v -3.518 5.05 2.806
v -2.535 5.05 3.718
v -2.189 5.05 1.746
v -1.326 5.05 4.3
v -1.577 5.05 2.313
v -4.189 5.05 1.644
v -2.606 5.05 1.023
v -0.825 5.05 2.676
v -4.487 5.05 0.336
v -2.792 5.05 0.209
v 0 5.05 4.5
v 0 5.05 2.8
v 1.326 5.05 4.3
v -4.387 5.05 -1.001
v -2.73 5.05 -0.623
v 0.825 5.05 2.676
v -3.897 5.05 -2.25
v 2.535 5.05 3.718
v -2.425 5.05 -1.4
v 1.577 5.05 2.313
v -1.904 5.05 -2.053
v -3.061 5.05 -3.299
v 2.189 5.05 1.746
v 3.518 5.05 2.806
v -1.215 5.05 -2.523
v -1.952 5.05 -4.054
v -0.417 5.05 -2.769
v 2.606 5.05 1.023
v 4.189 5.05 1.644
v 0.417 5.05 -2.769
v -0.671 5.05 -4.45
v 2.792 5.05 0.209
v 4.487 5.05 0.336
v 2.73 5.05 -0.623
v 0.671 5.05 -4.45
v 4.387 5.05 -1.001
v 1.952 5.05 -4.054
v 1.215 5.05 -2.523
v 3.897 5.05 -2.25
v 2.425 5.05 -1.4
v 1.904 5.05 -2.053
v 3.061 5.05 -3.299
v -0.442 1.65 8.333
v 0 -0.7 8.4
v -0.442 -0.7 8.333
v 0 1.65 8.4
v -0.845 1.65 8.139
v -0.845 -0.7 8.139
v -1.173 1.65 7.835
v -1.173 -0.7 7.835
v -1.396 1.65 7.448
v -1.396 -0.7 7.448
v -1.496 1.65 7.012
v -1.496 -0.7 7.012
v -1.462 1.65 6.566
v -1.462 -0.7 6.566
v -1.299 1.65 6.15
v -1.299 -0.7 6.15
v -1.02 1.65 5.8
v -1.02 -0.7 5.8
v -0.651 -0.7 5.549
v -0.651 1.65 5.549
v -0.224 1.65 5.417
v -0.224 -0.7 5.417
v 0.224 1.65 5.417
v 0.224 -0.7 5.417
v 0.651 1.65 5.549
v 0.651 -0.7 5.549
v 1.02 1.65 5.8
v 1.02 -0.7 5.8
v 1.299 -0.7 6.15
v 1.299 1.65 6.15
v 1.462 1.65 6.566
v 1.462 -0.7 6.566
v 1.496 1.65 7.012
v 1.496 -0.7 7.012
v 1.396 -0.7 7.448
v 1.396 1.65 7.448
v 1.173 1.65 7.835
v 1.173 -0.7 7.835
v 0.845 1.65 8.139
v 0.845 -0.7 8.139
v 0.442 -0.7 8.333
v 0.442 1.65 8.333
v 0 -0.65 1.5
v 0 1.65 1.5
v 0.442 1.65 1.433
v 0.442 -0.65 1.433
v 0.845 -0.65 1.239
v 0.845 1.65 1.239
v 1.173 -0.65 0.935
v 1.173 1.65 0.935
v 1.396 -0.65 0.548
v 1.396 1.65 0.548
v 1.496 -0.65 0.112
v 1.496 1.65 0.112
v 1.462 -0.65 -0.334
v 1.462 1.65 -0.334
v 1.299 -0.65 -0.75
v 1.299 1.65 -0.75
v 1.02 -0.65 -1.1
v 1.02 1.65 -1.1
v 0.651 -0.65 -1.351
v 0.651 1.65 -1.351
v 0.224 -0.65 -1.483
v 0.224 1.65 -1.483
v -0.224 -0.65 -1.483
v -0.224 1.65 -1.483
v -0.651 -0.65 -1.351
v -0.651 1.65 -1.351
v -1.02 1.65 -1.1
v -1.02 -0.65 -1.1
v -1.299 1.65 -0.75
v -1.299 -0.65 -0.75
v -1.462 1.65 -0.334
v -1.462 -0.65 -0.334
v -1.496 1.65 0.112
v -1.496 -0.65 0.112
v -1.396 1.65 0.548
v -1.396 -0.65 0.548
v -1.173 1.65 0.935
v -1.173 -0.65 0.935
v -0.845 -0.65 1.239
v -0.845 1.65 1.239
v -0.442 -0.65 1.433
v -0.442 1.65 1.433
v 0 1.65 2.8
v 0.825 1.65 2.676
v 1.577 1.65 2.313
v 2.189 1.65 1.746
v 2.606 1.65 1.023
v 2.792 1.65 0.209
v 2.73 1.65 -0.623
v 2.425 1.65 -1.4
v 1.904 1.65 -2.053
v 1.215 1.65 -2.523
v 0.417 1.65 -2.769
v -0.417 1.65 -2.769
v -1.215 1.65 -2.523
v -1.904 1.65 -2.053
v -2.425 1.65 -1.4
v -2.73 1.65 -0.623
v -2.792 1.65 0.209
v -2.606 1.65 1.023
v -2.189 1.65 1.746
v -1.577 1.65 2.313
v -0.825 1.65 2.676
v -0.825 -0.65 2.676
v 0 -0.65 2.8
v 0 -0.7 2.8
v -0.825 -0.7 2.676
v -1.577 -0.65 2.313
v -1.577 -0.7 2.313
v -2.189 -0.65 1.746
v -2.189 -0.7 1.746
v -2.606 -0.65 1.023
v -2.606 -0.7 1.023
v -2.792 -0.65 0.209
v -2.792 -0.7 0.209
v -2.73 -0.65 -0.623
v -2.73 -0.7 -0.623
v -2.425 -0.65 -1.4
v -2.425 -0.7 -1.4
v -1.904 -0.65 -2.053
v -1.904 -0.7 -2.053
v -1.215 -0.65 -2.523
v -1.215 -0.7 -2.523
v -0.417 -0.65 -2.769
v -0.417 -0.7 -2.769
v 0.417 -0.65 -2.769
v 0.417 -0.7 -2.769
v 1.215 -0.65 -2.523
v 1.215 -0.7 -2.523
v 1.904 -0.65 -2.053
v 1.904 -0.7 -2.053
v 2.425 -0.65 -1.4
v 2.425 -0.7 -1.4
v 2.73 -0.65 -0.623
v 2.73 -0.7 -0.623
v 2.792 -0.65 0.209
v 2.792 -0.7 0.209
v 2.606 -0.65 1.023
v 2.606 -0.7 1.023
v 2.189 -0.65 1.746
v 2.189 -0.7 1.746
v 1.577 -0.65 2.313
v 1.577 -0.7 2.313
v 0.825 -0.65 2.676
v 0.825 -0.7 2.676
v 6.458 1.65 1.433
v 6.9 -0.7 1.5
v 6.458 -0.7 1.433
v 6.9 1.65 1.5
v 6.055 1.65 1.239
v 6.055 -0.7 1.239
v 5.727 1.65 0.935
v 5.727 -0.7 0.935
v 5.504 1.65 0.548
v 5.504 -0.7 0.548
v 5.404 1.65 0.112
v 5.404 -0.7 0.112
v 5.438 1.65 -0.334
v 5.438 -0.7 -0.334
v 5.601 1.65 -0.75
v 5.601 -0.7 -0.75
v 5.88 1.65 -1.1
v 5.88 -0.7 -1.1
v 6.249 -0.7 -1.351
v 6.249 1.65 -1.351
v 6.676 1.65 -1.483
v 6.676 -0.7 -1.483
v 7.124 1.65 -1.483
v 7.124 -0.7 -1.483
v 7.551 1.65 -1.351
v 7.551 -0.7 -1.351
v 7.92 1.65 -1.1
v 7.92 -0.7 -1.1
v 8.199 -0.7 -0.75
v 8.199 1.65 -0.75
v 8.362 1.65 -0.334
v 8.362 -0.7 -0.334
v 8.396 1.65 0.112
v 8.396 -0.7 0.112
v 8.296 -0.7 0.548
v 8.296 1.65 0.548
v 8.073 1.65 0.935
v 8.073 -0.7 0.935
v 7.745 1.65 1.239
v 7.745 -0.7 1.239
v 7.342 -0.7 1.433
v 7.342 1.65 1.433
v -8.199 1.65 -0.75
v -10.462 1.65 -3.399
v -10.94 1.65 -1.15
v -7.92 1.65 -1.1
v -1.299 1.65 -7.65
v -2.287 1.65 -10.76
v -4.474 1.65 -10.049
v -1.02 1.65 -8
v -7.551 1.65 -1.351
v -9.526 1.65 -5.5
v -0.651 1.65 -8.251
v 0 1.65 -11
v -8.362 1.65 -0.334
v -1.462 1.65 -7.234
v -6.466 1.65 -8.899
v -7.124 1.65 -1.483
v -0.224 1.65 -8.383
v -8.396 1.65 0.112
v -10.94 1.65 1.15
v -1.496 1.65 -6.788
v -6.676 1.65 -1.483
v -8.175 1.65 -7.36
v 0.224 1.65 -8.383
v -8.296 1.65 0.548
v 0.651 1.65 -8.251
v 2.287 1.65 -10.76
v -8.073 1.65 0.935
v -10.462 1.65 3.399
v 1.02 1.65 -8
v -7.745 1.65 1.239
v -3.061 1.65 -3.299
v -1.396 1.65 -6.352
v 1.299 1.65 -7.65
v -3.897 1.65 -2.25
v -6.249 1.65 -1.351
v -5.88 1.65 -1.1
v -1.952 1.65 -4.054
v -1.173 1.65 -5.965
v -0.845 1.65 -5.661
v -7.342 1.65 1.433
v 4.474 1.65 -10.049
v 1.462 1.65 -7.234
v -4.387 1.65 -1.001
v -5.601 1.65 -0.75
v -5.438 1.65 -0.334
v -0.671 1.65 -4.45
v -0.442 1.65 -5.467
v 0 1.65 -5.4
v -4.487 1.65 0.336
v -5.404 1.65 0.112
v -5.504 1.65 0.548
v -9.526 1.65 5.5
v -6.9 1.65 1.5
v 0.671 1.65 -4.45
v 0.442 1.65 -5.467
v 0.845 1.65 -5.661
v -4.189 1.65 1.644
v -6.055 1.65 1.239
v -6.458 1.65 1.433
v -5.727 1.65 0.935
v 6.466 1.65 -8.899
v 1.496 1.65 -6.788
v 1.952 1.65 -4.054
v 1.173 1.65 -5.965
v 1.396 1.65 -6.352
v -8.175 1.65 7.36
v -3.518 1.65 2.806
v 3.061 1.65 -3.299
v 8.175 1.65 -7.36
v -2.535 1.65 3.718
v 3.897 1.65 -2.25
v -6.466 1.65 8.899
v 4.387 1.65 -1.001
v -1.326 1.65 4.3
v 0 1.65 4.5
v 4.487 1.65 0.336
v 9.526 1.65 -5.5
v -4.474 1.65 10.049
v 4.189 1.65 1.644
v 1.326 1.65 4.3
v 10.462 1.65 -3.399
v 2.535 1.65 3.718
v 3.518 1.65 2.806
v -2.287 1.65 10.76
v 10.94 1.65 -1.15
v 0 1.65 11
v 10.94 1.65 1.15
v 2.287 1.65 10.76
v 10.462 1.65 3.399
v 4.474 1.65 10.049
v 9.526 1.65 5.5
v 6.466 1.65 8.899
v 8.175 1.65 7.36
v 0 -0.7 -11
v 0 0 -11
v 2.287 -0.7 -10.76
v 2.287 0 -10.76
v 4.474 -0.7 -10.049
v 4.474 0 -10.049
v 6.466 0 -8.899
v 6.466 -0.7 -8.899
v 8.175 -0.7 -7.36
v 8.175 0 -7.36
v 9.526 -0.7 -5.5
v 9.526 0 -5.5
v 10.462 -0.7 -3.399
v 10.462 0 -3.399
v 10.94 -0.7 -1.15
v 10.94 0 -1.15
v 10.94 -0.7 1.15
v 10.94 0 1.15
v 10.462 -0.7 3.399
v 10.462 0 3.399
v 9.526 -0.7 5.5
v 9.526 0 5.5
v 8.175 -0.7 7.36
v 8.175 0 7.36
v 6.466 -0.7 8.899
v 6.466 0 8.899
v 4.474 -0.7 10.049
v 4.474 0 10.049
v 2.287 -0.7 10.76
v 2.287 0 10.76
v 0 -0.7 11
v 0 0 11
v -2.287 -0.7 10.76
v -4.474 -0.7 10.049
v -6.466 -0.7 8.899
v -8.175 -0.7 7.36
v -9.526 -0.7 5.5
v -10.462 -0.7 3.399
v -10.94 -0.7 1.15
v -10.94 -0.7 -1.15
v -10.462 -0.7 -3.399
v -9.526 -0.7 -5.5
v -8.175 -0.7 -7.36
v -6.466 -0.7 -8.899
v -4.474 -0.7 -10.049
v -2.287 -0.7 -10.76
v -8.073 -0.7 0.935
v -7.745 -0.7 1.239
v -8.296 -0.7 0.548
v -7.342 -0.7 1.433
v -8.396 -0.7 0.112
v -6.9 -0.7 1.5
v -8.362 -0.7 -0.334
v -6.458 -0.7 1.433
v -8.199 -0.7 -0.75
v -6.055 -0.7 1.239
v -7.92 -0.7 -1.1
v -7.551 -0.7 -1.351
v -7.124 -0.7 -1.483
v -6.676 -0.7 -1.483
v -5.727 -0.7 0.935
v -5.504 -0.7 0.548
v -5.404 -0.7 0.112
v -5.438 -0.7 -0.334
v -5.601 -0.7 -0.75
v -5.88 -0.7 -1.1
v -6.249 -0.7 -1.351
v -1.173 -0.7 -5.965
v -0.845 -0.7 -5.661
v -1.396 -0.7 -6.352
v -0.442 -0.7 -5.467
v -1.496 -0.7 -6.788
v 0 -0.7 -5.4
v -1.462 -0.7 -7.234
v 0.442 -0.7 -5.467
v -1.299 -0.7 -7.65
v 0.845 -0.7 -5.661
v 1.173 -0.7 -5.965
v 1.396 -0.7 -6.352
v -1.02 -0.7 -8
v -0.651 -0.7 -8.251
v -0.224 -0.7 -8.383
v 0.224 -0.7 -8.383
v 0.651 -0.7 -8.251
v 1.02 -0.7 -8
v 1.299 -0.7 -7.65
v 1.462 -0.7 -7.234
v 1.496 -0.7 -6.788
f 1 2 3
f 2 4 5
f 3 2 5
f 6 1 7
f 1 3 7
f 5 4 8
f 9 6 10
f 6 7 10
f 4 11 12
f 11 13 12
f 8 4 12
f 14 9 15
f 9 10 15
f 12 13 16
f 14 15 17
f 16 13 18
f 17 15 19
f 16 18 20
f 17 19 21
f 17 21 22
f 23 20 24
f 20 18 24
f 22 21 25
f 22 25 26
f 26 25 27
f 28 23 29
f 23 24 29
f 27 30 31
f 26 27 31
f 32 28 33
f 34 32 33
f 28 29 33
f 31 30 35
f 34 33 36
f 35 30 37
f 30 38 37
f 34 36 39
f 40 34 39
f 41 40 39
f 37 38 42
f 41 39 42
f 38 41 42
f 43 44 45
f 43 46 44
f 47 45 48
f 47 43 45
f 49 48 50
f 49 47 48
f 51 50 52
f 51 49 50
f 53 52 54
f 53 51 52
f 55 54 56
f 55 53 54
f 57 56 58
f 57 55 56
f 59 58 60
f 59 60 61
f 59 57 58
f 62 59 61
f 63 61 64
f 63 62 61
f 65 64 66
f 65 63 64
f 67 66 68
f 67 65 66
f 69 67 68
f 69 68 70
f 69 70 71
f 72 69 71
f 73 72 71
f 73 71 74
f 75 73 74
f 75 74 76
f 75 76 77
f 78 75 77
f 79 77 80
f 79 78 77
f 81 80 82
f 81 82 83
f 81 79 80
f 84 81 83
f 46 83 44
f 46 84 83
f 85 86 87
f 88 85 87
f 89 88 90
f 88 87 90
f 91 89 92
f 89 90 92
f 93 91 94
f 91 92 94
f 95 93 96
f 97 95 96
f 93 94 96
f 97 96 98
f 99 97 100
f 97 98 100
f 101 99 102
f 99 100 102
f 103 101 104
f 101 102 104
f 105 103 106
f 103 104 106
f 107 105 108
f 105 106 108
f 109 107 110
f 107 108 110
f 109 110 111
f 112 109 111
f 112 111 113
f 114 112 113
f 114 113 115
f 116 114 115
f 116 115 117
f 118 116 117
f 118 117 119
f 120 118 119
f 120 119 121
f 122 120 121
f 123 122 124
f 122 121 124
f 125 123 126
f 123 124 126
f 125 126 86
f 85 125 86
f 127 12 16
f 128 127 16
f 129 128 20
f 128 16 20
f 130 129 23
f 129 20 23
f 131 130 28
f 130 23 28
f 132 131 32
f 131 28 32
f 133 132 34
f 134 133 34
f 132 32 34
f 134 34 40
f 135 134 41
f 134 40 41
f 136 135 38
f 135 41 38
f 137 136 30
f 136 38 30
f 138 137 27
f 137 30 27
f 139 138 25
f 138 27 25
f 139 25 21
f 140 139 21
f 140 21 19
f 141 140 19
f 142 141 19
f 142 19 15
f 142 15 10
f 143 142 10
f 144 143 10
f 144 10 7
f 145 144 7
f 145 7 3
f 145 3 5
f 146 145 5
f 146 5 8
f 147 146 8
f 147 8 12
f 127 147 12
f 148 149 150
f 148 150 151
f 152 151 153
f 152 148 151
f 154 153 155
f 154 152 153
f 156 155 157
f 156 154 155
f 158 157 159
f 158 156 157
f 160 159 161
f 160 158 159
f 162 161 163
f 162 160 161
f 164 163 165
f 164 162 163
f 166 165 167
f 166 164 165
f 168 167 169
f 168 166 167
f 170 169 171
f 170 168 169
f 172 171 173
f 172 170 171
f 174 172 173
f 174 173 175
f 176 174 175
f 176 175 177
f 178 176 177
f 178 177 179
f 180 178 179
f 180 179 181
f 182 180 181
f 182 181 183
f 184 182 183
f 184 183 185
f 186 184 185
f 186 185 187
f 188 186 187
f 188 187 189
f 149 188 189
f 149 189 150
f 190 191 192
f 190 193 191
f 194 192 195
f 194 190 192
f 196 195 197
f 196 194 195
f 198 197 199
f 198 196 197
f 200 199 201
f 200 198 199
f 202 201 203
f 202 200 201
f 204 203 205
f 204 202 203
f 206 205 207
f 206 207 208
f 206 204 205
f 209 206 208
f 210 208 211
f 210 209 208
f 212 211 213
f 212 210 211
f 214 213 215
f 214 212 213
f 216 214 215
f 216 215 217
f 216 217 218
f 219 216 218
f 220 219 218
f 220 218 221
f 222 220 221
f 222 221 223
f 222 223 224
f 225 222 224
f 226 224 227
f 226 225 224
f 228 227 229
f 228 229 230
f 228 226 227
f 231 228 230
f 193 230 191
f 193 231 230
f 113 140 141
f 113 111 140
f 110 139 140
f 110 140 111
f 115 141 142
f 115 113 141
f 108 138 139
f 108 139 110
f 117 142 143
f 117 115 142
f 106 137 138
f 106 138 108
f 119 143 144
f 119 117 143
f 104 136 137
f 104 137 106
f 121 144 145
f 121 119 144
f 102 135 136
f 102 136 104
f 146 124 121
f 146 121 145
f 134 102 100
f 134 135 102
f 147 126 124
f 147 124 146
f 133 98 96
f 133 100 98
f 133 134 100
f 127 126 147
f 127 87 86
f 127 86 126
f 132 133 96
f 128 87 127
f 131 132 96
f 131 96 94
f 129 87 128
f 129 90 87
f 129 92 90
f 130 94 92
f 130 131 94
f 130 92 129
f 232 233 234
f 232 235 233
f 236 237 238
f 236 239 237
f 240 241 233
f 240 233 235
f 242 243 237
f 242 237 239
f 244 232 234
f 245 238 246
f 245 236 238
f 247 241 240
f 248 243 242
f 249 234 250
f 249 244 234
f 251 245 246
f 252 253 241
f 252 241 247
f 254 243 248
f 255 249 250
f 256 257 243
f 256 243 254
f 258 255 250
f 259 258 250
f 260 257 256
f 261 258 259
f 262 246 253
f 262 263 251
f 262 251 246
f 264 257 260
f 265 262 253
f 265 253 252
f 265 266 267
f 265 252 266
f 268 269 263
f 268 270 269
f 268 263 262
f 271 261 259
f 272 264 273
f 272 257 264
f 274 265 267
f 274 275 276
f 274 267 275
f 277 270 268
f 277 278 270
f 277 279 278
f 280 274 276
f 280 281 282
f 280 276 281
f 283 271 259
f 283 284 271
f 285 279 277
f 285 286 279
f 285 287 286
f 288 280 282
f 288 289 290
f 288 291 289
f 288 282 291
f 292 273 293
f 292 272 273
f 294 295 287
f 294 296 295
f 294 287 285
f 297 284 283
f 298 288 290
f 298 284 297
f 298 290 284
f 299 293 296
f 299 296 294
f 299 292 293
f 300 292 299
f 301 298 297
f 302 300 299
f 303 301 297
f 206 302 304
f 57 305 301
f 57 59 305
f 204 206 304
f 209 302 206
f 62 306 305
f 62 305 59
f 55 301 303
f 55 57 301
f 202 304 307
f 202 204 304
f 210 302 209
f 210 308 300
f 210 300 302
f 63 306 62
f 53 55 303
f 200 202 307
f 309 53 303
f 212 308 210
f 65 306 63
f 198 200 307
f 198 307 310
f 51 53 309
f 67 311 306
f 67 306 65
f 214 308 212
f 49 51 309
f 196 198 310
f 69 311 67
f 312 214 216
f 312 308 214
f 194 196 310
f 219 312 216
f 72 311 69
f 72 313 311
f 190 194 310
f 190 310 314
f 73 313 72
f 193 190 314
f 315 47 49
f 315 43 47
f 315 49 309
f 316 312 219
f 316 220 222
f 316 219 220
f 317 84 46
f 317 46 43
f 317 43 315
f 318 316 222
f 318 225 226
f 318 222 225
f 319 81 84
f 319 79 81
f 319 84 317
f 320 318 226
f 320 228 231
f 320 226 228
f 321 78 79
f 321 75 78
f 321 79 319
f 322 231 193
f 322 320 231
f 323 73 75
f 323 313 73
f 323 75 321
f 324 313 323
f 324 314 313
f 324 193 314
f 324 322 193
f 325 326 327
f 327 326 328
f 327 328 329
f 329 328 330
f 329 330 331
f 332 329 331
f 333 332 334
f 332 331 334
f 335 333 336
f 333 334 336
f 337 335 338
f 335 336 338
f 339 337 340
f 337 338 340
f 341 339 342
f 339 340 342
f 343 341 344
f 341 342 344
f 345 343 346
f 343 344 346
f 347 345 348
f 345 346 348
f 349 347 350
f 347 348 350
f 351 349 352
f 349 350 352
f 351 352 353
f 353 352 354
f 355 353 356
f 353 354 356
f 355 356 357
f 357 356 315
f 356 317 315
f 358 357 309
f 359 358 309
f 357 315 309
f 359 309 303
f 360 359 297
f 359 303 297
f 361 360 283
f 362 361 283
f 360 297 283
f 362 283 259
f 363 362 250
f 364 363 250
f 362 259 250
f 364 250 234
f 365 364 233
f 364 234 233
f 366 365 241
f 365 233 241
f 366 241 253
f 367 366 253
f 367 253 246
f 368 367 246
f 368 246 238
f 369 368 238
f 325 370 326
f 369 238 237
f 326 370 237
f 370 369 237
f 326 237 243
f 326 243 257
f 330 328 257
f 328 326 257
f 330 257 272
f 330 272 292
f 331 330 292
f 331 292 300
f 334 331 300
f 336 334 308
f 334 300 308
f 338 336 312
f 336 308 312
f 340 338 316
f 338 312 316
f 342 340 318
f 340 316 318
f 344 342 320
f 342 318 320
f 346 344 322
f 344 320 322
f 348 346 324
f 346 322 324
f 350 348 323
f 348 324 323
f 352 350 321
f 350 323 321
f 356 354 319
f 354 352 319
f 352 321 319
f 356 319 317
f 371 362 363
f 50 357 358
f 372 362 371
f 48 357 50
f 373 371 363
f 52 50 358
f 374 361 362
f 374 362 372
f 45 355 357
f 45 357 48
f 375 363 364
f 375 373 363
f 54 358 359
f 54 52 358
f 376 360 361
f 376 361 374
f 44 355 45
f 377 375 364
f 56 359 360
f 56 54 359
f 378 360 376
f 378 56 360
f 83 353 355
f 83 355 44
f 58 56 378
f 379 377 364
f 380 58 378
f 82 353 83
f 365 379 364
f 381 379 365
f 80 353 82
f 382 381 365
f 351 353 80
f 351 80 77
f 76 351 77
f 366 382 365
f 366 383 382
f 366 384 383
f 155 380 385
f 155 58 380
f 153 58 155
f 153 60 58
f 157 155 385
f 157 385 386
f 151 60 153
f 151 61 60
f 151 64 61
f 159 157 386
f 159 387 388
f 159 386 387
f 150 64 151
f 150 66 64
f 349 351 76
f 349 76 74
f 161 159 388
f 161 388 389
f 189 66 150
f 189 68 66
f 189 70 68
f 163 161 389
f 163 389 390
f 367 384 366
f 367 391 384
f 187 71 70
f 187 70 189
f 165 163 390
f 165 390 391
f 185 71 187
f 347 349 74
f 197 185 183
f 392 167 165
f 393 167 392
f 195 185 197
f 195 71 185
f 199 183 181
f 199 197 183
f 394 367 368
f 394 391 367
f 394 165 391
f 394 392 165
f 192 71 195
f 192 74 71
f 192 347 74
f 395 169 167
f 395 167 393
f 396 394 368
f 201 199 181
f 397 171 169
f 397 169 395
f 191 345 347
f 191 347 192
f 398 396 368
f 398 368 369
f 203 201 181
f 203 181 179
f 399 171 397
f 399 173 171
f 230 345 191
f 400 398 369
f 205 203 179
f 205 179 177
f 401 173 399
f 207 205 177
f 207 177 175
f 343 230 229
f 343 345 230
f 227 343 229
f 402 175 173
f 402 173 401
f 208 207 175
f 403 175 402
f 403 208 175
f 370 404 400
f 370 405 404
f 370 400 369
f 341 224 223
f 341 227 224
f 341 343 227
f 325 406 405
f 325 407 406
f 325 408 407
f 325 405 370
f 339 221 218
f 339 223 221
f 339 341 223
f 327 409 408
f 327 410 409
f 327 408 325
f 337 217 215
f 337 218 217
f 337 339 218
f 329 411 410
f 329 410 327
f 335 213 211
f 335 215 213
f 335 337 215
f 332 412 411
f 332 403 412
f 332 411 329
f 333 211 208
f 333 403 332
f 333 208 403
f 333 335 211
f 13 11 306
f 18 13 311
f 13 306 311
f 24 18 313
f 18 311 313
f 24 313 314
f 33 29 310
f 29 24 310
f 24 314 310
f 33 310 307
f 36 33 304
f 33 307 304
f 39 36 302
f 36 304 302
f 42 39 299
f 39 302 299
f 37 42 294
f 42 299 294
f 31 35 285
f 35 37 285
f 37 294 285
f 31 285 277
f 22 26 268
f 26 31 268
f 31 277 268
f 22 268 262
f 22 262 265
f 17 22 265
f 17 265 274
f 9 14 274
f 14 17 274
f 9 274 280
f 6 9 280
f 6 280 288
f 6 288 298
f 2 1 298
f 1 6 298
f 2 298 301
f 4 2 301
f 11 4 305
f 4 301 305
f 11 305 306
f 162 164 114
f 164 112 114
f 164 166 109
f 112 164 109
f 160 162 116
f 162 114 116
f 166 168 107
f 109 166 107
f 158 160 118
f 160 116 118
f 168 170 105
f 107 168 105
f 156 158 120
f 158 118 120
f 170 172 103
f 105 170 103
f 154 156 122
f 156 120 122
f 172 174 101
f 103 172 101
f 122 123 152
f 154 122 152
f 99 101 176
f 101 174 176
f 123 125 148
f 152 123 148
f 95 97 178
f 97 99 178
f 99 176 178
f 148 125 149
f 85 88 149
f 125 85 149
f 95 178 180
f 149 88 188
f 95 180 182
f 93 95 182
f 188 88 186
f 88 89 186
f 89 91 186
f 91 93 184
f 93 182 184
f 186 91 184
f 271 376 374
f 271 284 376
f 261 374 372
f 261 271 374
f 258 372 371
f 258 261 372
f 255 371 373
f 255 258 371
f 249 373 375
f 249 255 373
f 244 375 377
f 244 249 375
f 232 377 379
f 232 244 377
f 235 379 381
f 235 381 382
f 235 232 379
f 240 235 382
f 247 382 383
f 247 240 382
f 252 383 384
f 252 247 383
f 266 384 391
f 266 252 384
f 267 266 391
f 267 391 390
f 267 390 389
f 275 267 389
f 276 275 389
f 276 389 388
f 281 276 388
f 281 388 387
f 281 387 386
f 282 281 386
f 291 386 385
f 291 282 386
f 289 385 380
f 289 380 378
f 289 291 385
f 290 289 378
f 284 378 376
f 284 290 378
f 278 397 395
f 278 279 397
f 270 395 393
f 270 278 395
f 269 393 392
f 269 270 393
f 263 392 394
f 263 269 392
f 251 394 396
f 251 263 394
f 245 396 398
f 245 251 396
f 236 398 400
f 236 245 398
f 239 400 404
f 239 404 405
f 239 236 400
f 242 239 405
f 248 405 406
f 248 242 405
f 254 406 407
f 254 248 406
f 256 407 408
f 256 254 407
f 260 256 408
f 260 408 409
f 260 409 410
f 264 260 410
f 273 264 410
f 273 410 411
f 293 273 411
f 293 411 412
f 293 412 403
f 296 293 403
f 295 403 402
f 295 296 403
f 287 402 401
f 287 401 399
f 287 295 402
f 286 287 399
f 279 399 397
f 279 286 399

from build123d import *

# Parameters (mm, degrees)
SKETCH1_R           = 11
BOSS_EXTRUDE2_DEPTH = 5.65
SKETCH3_R           = 2.8
SKETCH3_R_2         = 1.5
CUT_EXTRUDE2_DEPTH  = 12
CUT_EXTRUDE3_START  = -4
SKETCH4_R           = 11
SKETCH4_R_2         = 4.5
CUT_EXTRUDE3_DEPTH  = 4
SKETCH5_W           = 9
SKETCH5_H           = 0.6
CUT_EXTRUDE4_DEPTH  = 18
SKETCH6_R           = 2.8
SKETCH6_R_2         = 1.5
BOSS_EXTRUDE4_DEPTH = 2.3
SKETCH7_R           = 11
SKETCH7_R_2         = 2.8
SKETCH7_R_3         = 1.5
BOSS_EXTRUDE5_DEPTH = 0.7


with BuildPart() as part:
    # Sketch1 → Boss-Extrude2 (new body)
    with BuildSketch(Plane(origin=(0, 0, 0), x_dir=(1, 0, 0), z_dir=(0, 1, 0))):
        with Locations(Location((0, 0, 0), (0, 0, 270))):
            Circle(SKETCH1_R)
    extrude(amount=BOSS_EXTRUDE2_DEPTH)

    # Sketch3 → Cut-Extrude2 (cut)
    with BuildSketch(Plane(origin=(0, 5.65, 0), x_dir=(1, 0, 0), z_dir=(0, 1, 0))):
        with Locations(Location((0, 0, 0), (0, 0, 270))):
            Circle(SKETCH3_R)
        with Locations(Location((-6.9, 0, 0), (0, 0, 270))):
            Circle(SKETCH3_R_2)
        with Locations(Location((0, 6.9, 0), (0, 0, 270))):
            Circle(SKETCH3_R_2)
        with Locations(Location((6.9, 0, 0), (0, 0, 270))):
            Circle(SKETCH3_R_2)
        with Locations(Location((0, -6.9, 0), (0, 0, 270))):
            Circle(SKETCH3_R_2)
    extrude(amount=-CUT_EXTRUDE2_DEPTH, mode=Mode.SUBTRACT)

    # Sketch4 → Cut-Extrude3 (cut)
    with BuildSketch(Plane(origin=(0, 5.65, 0), x_dir=(1, 0, 0), z_dir=(0, 1, 0)).offset(CUT_EXTRUDE3_START)):
        with Locations(Location((0, 0, 0), (0, 0, 270))):
            Circle(SKETCH4_R)
        with Locations(Location((0, 0, 0), (0, 0, 270))):
            Circle(SKETCH4_R_2, mode=Mode.SUBTRACT)
    extrude(amount=CUT_EXTRUDE3_DEPTH, mode=Mode.SUBTRACT)

    # Sketch5 → Cut-Extrude4 (cut)
    with BuildSketch(Plane(origin=(10, 0, 0), x_dir=(0, 0, -1), z_dir=(1, 0, 0))):
        with Locations((0, 5.35)):
            Rectangle(SKETCH5_W, SKETCH5_H)
    extrude(amount=-CUT_EXTRUDE4_DEPTH, mode=Mode.SUBTRACT)

    # Sketch6 → Boss-Extrude4 (add)
    with BuildSketch(Plane(origin=(0, 1.65, 0), x_dir=(1, 0, 0), z_dir=(0, 1, 0))):
        with Locations(Location((0, 0, 0), (0, 0, 270))):
            Circle(SKETCH6_R)
        with Locations(Location((0, 0, 0), (0, 0, 270))):
            Circle(SKETCH6_R_2, mode=Mode.SUBTRACT)
    extrude(amount=-BOSS_EXTRUDE4_DEPTH)

    # Sketch7 → Boss-Extrude5 (add)
    with BuildSketch(Plane.XZ):
        with Locations(Location((0, 0, 0), (0, 0, 270))):
            Circle(SKETCH7_R)
        with Locations(Location((0, 0, 0), (0, 0, 90))):
            Circle(SKETCH7_R_2, mode=Mode.SUBTRACT)
        with Locations(Location((0, 6.9, 0), (0, 0, 90))):
            Circle(SKETCH7_R_3, mode=Mode.SUBTRACT)
        with Locations(Location((6.9, 0, 0), (0, 0, 90))):
            Circle(SKETCH7_R_3, mode=Mode.SUBTRACT)
        with Locations(Location((0, -6.9, 0), (0, 0, 90))):
            Circle(SKETCH7_R_3, mode=Mode.SUBTRACT)
        with Locations(Location((-6.9, 0, 0), (0, 0, 90))):
            Circle(SKETCH7_R_3, mode=Mode.SUBTRACT)
    extrude(amount=BOSS_EXTRUDE5_DEPTH)


solid = part.part
